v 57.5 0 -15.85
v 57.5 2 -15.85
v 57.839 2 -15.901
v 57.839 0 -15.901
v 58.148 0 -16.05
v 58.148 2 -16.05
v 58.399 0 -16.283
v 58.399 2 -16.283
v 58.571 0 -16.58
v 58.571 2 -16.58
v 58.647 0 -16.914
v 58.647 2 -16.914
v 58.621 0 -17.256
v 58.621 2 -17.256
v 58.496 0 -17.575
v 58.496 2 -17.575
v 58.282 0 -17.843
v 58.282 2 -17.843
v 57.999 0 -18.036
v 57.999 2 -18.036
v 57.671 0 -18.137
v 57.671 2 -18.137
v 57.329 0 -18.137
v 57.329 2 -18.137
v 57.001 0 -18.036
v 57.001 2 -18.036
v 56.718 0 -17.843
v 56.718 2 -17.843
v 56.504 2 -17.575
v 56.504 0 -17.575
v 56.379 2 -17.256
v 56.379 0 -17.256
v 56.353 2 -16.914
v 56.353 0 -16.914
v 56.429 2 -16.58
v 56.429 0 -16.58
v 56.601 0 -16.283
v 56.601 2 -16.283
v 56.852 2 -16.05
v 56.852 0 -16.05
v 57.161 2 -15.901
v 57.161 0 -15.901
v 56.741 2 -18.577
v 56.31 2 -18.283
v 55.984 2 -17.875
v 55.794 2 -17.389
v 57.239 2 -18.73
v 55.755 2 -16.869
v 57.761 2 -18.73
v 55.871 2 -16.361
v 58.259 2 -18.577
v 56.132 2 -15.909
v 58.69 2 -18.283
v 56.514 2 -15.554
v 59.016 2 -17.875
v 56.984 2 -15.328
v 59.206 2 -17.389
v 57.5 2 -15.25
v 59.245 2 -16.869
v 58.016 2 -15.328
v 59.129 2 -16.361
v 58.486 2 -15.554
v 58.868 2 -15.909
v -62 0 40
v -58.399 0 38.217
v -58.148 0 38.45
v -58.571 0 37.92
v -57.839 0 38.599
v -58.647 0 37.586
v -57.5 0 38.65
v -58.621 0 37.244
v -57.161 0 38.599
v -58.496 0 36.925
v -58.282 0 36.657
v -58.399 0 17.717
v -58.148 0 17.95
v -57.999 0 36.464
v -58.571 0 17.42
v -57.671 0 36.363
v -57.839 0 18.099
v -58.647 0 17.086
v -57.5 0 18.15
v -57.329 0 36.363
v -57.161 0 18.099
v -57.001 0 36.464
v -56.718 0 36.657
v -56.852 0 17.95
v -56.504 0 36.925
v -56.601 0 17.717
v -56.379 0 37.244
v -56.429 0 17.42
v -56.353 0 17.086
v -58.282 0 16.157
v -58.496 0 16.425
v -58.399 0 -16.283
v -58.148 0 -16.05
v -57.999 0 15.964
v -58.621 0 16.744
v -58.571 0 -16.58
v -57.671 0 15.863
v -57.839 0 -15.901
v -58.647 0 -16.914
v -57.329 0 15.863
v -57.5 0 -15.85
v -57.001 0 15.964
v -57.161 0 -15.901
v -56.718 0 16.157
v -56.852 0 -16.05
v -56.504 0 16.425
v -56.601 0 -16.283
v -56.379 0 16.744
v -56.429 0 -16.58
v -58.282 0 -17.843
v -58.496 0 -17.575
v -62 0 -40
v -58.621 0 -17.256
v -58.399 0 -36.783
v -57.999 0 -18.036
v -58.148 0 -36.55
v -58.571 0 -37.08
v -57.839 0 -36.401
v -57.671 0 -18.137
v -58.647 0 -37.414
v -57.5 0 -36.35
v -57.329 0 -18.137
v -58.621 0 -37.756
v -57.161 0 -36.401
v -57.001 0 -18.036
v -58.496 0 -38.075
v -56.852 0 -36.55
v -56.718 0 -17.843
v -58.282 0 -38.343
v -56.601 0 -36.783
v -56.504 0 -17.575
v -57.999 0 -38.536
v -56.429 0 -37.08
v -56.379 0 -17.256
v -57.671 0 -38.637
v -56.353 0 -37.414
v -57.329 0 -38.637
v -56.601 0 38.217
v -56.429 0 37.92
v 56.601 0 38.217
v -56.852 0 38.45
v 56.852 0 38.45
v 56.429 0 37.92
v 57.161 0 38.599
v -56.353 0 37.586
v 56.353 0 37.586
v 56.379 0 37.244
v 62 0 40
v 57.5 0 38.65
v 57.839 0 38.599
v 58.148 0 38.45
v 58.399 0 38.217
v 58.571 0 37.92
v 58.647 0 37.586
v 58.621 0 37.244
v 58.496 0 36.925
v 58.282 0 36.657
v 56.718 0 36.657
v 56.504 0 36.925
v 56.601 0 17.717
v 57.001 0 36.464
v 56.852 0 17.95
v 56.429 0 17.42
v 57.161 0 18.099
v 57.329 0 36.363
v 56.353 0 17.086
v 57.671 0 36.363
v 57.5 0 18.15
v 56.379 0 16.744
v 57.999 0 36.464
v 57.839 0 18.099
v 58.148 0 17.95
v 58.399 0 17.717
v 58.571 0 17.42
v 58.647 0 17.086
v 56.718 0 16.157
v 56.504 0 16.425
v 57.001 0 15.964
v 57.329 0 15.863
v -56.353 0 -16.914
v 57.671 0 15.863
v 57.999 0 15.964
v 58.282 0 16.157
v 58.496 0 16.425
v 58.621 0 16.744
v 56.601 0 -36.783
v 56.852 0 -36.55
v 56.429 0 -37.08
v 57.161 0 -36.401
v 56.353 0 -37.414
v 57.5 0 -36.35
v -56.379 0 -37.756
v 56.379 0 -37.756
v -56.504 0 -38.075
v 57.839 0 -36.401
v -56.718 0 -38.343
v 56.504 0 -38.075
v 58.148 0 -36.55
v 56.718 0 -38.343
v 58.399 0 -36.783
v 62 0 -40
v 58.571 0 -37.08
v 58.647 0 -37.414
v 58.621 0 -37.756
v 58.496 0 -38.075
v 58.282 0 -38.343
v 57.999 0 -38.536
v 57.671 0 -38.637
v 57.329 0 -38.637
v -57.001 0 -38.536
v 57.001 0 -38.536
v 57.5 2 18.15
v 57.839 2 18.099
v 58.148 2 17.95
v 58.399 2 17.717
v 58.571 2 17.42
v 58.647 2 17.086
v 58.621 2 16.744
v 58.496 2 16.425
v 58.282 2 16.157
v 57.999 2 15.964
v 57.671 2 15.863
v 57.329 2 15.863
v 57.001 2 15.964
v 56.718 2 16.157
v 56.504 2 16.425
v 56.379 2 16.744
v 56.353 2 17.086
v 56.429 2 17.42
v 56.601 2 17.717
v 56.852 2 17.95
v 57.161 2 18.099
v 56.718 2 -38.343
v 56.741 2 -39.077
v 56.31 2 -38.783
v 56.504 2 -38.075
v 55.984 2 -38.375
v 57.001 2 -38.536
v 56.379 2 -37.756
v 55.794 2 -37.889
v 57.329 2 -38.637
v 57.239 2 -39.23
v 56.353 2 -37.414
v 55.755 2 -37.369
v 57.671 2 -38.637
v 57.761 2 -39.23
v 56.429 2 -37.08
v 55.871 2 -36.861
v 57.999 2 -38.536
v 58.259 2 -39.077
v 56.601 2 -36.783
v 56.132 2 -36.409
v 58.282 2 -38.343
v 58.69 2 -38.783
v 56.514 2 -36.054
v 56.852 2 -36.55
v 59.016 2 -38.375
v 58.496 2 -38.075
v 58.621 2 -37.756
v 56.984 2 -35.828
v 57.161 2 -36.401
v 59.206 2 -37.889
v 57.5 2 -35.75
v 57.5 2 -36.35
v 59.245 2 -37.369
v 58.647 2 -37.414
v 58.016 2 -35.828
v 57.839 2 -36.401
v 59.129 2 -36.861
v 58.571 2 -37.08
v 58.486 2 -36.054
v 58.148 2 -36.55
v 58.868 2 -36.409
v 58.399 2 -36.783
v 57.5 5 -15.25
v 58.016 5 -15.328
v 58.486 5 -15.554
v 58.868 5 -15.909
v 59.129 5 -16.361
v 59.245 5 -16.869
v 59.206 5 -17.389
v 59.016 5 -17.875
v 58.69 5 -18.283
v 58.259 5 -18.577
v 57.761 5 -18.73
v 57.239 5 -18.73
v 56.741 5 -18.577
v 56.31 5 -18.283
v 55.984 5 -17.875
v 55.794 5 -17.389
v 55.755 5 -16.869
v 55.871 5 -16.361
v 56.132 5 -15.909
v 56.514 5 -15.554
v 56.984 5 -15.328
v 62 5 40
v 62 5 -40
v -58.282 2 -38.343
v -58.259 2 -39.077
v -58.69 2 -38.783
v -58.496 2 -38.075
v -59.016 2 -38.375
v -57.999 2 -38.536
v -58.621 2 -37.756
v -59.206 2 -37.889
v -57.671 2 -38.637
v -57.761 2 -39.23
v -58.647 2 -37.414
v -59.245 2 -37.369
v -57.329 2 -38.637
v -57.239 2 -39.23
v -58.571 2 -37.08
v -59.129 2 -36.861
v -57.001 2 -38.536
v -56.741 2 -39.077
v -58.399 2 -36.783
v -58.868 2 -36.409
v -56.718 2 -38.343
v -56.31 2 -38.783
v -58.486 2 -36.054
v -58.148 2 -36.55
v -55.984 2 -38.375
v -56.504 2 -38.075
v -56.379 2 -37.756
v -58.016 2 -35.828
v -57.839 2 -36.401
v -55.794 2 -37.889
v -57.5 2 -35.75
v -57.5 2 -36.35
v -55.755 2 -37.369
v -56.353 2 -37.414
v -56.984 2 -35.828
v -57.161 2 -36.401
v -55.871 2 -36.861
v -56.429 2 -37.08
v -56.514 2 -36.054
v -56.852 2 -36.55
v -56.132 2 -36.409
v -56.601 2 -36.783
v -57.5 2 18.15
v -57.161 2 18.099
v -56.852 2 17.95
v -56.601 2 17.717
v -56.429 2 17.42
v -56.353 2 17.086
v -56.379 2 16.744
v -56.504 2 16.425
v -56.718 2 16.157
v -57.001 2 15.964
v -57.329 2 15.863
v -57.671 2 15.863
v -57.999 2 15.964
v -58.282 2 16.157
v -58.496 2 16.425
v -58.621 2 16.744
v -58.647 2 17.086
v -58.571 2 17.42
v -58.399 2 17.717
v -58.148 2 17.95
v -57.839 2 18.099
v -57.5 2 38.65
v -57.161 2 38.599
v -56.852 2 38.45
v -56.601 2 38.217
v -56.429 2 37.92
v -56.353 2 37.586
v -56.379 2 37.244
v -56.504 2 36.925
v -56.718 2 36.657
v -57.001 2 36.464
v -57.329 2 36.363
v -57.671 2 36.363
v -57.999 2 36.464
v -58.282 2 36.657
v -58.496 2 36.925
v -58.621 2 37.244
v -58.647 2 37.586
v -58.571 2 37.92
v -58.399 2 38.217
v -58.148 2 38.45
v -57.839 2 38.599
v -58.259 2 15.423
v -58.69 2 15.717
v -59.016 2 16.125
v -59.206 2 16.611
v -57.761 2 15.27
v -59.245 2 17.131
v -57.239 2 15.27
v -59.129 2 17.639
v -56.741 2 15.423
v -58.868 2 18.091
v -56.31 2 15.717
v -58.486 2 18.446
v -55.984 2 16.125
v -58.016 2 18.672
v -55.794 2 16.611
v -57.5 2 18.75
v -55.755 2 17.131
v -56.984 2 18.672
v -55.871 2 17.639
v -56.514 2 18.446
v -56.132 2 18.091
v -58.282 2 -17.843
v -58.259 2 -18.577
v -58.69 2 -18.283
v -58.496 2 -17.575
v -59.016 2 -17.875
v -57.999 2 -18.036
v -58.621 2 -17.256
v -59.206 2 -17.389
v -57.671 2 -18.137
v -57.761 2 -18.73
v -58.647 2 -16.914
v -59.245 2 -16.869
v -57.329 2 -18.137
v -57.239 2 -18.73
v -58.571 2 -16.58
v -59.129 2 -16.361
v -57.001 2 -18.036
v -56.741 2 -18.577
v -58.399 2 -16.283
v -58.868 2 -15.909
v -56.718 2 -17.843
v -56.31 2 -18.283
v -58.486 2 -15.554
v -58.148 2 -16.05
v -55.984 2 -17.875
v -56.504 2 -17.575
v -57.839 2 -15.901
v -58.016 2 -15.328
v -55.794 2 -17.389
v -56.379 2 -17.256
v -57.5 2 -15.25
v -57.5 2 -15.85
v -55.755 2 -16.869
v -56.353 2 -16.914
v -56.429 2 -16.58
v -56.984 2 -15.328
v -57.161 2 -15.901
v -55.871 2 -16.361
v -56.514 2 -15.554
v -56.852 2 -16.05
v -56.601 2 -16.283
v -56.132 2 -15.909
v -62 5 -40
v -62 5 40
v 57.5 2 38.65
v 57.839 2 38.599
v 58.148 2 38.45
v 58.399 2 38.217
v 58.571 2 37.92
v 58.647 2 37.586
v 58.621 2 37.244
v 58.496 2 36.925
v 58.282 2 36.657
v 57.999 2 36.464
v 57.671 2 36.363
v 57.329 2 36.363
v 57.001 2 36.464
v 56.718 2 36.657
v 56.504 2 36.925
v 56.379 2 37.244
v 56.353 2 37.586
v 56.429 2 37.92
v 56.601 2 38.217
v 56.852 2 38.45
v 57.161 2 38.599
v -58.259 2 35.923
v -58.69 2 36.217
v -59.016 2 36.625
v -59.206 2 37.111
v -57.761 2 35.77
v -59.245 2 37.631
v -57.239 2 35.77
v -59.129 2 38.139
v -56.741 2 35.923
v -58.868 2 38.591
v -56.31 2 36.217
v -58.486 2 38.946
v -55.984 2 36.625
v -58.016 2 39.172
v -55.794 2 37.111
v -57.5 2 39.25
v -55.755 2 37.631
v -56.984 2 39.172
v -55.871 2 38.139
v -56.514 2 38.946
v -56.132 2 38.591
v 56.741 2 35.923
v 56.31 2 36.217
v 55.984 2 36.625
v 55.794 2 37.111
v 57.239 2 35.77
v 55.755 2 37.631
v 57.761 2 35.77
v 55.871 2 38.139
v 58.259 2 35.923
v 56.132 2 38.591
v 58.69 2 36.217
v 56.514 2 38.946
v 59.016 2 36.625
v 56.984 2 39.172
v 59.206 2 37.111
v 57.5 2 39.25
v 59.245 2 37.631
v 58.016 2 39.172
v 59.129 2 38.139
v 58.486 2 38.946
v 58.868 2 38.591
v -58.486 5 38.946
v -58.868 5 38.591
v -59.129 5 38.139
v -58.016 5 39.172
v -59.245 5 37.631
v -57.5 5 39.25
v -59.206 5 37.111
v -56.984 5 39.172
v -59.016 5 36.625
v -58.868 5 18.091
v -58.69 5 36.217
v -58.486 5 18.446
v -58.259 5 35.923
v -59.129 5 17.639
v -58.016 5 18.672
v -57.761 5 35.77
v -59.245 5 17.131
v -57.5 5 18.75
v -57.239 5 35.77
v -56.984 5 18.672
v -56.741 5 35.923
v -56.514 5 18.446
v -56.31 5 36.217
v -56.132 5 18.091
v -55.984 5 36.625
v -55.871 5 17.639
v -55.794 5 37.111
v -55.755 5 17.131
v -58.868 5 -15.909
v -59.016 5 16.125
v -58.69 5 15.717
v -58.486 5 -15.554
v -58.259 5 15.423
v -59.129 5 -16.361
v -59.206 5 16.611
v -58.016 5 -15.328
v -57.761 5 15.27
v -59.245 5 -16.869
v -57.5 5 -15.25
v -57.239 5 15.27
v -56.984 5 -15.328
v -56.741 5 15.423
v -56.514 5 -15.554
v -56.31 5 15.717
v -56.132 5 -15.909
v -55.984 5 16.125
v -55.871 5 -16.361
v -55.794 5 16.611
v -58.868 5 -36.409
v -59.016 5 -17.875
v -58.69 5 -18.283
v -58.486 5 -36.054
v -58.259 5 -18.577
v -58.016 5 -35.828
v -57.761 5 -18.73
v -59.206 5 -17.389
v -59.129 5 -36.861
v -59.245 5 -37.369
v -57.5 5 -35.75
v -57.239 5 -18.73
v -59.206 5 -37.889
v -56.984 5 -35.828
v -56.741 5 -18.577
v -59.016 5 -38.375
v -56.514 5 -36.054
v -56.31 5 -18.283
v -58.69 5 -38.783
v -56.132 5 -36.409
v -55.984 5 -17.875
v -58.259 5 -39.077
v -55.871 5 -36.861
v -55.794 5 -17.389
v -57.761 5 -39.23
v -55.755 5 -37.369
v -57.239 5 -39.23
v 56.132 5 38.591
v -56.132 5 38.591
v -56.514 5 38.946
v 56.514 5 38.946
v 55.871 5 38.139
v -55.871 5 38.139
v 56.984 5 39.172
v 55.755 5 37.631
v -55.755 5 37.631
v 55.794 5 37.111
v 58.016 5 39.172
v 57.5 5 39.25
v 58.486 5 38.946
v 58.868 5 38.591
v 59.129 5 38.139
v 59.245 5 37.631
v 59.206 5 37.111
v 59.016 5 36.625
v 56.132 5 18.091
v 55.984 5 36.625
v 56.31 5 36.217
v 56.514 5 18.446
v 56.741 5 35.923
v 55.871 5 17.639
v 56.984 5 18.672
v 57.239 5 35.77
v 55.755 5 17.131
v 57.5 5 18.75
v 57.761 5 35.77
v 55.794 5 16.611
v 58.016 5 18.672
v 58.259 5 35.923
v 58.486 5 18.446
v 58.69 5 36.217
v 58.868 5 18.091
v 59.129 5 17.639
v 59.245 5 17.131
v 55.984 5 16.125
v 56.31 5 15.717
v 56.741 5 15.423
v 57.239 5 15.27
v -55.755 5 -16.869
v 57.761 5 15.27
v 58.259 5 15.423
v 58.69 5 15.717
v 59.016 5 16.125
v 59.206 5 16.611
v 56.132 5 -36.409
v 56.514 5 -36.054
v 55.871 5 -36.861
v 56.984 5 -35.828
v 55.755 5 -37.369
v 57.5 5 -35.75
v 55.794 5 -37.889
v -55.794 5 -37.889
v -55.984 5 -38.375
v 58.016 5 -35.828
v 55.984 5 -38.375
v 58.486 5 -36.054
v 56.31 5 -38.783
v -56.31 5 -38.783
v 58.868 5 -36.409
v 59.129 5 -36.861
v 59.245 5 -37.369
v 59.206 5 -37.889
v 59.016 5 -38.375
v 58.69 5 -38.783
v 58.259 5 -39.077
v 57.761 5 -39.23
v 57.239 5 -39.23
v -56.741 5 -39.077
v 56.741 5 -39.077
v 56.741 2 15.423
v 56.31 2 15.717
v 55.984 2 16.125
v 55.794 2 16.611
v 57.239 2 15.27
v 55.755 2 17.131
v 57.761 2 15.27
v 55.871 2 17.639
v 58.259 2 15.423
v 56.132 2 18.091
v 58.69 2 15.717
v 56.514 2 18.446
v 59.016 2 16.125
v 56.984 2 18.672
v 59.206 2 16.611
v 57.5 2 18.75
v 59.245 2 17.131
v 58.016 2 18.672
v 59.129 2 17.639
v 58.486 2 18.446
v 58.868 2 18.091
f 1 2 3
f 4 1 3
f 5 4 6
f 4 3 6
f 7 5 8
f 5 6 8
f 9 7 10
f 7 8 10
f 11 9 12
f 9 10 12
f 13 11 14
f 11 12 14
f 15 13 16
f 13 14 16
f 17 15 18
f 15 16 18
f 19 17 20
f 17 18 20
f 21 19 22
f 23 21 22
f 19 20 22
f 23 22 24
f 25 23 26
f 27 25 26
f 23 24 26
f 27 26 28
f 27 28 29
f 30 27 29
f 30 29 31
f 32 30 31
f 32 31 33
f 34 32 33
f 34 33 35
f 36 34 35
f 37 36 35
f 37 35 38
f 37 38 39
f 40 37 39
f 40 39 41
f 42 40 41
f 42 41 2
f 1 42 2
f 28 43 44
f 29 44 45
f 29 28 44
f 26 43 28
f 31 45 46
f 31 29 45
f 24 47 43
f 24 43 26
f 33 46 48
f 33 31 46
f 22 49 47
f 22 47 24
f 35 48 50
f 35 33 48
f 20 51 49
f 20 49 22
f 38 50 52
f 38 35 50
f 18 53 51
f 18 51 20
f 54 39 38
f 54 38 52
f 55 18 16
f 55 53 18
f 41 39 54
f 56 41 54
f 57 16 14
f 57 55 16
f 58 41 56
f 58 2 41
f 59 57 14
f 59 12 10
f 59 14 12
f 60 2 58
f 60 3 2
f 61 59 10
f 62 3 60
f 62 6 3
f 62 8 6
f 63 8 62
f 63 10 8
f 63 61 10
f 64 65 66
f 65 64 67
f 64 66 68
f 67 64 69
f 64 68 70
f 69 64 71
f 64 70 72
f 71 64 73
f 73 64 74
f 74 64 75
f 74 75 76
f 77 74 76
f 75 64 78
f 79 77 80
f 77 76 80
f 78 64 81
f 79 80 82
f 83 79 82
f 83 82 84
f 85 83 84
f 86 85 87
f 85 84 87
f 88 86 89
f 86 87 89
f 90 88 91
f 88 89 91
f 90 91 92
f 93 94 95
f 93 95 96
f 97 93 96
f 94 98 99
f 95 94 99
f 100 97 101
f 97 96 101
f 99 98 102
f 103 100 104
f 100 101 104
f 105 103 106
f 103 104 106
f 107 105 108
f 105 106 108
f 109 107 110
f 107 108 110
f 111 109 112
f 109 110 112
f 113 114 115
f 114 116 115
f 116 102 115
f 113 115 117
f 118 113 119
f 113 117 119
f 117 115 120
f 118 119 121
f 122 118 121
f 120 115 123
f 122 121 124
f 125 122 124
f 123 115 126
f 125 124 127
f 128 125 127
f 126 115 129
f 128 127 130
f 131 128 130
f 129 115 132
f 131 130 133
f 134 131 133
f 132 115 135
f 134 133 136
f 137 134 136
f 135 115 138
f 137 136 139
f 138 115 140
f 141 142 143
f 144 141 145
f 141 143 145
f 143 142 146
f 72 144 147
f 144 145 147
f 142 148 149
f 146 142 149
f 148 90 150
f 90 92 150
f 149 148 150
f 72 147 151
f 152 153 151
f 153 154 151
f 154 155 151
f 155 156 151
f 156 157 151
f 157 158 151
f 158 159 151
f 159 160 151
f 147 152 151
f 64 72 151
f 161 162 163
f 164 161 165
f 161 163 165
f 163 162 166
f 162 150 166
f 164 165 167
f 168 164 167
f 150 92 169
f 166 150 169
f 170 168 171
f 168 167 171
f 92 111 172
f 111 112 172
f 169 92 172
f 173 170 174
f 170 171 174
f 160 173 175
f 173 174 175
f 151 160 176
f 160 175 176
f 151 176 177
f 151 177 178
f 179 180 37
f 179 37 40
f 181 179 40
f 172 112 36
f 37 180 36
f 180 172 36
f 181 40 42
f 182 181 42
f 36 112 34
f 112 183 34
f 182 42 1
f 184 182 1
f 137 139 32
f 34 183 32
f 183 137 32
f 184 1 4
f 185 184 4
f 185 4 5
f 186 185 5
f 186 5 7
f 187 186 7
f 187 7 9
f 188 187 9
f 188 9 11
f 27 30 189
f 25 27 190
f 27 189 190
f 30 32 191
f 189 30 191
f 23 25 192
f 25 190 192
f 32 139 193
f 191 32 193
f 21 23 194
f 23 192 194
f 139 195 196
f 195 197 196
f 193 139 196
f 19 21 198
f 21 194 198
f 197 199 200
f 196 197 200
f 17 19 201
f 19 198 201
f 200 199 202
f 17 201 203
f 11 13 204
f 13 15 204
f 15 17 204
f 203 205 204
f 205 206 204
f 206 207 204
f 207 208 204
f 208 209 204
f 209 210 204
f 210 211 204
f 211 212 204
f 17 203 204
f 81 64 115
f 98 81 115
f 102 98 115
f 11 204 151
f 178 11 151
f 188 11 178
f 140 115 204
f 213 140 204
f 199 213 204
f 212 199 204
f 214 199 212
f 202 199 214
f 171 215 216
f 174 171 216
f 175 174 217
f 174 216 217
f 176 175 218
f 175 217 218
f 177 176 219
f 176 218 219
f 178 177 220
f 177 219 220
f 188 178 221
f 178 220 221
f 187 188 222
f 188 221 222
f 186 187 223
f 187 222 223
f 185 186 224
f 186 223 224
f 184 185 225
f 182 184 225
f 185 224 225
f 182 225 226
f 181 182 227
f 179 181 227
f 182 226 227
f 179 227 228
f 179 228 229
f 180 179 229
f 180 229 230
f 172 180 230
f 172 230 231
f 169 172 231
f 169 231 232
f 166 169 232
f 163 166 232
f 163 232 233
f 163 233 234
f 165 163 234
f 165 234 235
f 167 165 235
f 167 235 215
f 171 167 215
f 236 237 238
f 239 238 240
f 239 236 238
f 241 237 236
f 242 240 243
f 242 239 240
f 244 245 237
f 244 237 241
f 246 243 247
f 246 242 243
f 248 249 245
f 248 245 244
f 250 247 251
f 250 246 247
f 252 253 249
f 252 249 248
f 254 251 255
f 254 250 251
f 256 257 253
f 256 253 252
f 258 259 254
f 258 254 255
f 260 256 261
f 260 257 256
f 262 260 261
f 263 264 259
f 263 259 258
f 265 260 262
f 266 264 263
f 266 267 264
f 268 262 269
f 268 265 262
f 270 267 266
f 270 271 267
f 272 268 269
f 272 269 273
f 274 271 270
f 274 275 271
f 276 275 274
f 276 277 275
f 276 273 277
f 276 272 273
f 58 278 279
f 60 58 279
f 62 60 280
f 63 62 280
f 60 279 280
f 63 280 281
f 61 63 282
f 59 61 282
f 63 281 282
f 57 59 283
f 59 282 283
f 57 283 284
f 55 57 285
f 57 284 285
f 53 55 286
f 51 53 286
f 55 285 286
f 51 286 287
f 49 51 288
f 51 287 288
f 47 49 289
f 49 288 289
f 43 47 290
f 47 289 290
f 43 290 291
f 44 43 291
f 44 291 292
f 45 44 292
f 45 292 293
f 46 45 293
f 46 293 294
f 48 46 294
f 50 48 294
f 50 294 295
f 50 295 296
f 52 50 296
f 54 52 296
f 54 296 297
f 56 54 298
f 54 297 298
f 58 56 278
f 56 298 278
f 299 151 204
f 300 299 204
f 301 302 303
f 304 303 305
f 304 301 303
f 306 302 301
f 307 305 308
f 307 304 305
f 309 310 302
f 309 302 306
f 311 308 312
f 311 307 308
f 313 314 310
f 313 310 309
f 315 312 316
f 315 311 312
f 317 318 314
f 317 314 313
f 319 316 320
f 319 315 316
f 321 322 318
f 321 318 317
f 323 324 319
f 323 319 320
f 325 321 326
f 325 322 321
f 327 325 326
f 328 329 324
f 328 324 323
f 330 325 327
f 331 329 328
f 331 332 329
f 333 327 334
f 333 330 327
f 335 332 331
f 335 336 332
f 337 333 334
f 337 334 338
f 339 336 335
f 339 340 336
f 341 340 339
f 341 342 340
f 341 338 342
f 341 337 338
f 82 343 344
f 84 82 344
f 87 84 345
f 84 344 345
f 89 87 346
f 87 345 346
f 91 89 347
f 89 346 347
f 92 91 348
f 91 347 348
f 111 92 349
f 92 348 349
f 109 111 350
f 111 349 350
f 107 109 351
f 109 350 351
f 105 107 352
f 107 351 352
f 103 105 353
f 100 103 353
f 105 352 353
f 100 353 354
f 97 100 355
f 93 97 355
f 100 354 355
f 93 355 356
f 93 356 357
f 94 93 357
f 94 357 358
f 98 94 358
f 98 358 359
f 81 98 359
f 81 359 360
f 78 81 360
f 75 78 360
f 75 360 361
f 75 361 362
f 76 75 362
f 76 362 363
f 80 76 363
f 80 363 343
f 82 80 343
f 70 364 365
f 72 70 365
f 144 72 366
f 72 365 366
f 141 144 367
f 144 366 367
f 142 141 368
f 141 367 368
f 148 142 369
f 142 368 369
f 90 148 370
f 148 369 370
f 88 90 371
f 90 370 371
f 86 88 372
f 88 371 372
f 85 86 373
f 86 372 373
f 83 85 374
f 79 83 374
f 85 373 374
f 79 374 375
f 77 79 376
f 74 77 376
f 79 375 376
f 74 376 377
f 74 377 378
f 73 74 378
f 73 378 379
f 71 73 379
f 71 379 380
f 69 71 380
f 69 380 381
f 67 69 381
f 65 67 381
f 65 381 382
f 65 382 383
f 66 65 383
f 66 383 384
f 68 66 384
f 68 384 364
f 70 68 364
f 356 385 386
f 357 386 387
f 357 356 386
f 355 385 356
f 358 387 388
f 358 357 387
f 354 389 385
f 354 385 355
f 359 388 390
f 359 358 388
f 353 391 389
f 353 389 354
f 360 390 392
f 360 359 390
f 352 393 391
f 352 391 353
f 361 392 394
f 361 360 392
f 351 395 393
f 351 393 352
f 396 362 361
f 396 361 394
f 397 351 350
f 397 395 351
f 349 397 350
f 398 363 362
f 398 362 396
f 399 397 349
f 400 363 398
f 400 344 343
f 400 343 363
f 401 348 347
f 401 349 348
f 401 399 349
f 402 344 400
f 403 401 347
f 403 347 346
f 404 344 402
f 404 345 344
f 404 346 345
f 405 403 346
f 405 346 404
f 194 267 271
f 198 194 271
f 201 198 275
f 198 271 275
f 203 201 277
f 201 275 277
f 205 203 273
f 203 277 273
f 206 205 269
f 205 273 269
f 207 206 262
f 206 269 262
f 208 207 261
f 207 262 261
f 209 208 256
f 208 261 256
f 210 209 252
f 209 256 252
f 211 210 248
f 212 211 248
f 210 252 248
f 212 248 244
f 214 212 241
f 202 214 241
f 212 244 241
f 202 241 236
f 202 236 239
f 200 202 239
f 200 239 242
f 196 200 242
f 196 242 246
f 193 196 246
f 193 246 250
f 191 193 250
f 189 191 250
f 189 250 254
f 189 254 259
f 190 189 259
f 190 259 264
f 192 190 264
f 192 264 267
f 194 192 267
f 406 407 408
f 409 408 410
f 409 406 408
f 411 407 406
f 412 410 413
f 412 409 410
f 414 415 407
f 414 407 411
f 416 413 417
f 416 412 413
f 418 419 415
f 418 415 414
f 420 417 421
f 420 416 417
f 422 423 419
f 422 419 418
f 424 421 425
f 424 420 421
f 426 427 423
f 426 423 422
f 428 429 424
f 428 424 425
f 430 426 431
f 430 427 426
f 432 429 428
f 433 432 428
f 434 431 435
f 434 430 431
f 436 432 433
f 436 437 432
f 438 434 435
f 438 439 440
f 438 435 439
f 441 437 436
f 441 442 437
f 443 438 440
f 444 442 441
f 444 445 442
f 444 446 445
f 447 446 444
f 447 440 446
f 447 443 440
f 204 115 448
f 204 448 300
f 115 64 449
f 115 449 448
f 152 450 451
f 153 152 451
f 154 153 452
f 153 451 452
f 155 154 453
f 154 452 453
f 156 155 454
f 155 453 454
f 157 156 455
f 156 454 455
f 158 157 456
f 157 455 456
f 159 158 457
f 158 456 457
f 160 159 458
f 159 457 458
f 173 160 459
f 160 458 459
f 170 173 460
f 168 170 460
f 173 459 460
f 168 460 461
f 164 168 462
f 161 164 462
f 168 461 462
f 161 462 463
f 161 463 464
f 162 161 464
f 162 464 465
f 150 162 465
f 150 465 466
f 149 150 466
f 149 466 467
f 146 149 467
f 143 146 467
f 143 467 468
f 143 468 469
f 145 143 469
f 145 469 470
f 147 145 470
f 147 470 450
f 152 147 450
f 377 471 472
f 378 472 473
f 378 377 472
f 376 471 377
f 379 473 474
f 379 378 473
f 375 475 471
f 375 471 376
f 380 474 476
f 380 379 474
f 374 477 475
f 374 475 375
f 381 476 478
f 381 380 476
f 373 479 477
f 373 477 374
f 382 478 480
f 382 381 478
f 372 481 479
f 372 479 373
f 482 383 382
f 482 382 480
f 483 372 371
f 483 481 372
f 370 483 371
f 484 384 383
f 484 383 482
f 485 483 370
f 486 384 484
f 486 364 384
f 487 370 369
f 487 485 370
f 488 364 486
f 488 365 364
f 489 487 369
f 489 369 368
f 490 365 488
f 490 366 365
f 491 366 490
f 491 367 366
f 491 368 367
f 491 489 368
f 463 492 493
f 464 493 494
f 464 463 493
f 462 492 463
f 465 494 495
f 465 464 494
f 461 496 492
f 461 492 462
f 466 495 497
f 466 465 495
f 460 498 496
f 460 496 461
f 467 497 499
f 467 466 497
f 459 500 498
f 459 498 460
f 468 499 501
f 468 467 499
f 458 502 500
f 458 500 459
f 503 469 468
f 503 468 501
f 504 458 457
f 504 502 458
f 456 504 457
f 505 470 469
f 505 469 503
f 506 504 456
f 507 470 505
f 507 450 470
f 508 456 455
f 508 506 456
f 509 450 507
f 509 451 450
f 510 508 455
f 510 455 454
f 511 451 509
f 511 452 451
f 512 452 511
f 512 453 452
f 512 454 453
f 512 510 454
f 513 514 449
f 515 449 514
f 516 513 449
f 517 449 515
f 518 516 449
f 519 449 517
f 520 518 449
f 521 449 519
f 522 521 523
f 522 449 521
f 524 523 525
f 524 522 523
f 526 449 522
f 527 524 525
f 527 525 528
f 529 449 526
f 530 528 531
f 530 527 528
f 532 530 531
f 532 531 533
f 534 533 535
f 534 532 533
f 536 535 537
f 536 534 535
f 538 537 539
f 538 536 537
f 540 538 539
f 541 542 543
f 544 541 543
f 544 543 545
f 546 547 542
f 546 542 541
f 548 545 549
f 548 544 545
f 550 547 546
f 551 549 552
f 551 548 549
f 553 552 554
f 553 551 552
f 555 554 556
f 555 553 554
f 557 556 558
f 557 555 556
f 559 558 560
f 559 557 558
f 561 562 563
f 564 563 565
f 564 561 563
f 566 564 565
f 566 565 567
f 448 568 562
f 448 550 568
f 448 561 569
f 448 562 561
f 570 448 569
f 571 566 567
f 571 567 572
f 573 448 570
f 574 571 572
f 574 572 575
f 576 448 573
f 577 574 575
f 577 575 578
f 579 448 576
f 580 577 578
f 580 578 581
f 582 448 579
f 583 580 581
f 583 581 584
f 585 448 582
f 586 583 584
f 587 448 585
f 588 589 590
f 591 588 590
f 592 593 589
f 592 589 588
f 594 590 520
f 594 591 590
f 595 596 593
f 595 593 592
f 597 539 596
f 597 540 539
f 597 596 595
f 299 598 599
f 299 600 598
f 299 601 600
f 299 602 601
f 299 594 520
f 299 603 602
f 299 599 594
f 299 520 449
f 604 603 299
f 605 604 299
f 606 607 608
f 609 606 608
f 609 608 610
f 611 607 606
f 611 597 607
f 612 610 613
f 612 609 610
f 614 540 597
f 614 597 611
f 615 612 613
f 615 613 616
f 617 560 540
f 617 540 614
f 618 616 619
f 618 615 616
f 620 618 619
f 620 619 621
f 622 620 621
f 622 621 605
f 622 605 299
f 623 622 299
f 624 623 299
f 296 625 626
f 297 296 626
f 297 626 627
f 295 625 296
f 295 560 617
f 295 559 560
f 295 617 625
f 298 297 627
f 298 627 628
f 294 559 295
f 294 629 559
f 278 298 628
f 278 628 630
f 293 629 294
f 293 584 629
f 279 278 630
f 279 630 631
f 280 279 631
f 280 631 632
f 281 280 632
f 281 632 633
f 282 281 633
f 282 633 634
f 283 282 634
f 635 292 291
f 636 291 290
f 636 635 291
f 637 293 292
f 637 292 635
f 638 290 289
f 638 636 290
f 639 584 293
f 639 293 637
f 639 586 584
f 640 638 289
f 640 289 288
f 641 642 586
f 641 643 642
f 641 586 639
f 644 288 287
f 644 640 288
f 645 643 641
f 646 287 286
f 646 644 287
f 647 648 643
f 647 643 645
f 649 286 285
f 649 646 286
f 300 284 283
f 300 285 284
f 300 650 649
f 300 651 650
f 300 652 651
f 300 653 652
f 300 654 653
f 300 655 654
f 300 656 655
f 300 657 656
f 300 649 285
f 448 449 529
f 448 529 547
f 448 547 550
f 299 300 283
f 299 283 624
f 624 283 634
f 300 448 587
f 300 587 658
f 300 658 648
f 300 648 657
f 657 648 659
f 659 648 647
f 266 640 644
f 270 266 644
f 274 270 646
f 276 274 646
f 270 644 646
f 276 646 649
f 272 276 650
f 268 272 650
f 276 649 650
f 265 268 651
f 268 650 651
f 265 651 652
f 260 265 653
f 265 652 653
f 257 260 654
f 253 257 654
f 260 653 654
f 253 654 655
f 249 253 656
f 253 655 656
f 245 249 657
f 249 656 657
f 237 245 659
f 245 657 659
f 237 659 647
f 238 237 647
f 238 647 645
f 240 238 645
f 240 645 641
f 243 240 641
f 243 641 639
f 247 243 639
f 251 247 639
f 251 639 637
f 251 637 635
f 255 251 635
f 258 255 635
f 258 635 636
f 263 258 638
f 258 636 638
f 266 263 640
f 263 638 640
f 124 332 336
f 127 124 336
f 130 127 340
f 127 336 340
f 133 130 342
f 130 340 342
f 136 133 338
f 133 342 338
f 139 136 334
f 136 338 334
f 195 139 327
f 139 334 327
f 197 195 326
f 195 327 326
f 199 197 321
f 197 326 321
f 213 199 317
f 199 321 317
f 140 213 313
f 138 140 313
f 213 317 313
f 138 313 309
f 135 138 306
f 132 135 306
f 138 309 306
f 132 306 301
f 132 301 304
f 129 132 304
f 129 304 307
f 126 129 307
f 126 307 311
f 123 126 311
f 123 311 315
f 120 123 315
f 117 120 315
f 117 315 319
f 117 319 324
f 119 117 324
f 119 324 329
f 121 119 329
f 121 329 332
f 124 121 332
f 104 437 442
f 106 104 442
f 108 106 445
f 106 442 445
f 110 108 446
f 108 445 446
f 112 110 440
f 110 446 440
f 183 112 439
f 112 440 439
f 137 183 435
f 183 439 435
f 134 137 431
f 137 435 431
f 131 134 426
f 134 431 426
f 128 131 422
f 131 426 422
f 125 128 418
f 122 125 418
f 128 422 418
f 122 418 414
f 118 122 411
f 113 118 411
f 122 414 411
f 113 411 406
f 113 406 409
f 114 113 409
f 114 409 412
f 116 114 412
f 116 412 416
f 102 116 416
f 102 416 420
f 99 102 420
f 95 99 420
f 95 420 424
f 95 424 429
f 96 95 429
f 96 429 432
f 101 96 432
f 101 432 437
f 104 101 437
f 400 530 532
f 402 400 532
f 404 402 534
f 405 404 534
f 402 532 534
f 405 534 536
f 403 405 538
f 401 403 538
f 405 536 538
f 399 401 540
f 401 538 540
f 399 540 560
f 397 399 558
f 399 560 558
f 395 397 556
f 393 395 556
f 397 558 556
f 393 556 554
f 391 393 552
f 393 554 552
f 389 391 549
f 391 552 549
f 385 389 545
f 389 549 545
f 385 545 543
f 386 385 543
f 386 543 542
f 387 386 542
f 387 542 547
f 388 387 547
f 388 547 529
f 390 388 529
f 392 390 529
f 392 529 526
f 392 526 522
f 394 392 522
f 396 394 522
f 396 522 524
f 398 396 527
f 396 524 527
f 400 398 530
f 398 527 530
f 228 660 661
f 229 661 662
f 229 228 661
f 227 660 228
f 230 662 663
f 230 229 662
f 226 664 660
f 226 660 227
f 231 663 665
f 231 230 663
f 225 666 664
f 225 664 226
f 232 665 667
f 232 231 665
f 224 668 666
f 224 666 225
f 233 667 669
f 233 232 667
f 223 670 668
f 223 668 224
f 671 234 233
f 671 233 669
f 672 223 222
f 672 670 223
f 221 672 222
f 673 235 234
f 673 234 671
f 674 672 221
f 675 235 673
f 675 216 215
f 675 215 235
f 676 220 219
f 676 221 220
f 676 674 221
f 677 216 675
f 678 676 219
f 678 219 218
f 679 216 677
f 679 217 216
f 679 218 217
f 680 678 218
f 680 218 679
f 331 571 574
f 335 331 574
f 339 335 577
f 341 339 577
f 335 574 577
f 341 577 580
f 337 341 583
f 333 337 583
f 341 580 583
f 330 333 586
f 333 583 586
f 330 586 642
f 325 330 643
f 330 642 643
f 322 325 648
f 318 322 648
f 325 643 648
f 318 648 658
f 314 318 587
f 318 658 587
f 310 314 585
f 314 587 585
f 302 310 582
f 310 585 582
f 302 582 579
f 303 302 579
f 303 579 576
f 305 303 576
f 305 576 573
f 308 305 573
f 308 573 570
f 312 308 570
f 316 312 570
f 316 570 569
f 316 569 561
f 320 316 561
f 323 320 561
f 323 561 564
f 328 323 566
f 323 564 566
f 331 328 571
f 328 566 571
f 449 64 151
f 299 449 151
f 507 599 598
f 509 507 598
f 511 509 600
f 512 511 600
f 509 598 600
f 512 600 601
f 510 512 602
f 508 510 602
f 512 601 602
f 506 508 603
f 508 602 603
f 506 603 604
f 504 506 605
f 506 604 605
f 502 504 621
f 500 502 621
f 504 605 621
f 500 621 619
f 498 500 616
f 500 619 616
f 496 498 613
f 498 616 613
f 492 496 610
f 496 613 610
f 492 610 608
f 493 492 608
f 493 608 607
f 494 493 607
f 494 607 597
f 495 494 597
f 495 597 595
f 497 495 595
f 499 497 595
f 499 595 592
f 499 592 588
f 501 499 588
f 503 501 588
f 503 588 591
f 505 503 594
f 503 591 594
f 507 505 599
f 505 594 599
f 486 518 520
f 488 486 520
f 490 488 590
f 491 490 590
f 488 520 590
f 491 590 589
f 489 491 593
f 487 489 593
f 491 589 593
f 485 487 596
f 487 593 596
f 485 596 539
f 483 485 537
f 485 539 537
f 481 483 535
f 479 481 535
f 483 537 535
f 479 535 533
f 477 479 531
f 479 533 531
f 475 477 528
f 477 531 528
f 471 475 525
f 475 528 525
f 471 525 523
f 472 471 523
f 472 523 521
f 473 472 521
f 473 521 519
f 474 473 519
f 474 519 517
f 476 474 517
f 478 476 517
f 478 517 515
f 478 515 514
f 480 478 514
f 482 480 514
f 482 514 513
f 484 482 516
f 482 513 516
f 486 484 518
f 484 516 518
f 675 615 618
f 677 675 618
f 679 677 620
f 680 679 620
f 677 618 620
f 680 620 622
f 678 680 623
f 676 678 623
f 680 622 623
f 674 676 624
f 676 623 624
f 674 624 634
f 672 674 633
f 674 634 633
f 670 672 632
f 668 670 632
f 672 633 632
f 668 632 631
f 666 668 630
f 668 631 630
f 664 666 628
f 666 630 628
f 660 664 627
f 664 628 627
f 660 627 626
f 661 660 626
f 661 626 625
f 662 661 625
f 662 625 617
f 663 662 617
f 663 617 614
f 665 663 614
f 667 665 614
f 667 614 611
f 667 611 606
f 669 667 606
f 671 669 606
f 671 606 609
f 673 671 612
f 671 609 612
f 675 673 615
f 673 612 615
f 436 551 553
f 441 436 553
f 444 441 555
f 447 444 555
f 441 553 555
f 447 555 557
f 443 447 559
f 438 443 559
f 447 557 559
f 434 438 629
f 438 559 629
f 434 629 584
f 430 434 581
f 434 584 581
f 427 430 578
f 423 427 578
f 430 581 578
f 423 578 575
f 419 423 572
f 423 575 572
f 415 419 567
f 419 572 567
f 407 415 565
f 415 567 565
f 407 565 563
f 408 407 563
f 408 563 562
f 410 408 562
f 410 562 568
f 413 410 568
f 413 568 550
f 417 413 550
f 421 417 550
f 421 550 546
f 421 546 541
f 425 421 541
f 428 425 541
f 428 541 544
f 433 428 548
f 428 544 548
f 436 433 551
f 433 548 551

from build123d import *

# Parameters (mm, degrees)
SKETCH_1_W          = 124
SKETCH_1_H          = 80
EXTRUDE_1_DEPTH     = 5
SKETCH_2_R          = 1.15
CUT_EXTRUDE_1_DEPTH = 74.952687578
SKETCH_2_3_R        = 1.75
CUT_EXTRUDE_2_DEPTH = 3


with BuildPart() as part:
    # 草图1 → 凸台-拉伸1 (new body)
    with BuildSketch(Plane(origin=(0, 0, 0), x_dir=(1, 0, 0), z_dir=(0, 1, 0))):
        Rectangle(SKETCH_1_W, SKETCH_1_H)
    extrude(amount=EXTRUDE_1_DEPTH)

    # 草图2 → 切除-拉伸1 (cut, through all)
    with BuildSketch(Plane(origin=(0, 5, 0), x_dir=(1, 0, 0), z_dir=(0, 1, 0))):
        with Locations((-57.5, 37.5)):
            Circle(SKETCH_2_R)
        with Locations((-57.5, 17)):
            Circle(SKETCH_2_R)
        with Locations((-57.5, -17)):
            Circle(SKETCH_2_R)
        with Locations((-57.5, -37.5)):
            Circle(SKETCH_2_R)
        with Locations((57.5, 37.5)):
            Circle(SKETCH_2_R)
        with Locations((57.5, 17)):
            Circle(SKETCH_2_R)
        with Locations((57.5, -17)):
            Circle(SKETCH_2_R)
        with Locations((57.5, -37.5)):
            Circle(SKETCH_2_R)
    extrude(amount=-CUT_EXTRUDE_1_DEPTH, mode=Mode.SUBTRACT)

    # 草图2<3> → 切除-拉伸2 (cut)
    with BuildSketch(Plane(origin=(0, 5, 0), x_dir=(1, 0, 0), z_dir=(0, 1, 0))):
        with Locations((-57.5, 37.5)):
            Circle(SKETCH_2_3_R)
        with Locations((-57.5, 17)):
            Circle(SKETCH_2_3_R)
        with Locations((-57.5, -17)):
            Circle(SKETCH_2_3_R)
        with Locations((-57.5, -37.5)):
            Circle(SKETCH_2_3_R)
        with Locations((57.5, 37.5)):
            Circle(SKETCH_2_3_R)
        with Locations((57.5, 17)):
            Circle(SKETCH_2_3_R)
        with Locations((57.5, -17)):
            Circle(SKETCH_2_3_R)
        with Locations((57.5, -37.5)):
            Circle(SKETCH_2_3_R)
    extrude(amount=-CUT_EXTRUDE_2_DEPTH, mode=Mode.SUBTRACT)


solid = part.part
